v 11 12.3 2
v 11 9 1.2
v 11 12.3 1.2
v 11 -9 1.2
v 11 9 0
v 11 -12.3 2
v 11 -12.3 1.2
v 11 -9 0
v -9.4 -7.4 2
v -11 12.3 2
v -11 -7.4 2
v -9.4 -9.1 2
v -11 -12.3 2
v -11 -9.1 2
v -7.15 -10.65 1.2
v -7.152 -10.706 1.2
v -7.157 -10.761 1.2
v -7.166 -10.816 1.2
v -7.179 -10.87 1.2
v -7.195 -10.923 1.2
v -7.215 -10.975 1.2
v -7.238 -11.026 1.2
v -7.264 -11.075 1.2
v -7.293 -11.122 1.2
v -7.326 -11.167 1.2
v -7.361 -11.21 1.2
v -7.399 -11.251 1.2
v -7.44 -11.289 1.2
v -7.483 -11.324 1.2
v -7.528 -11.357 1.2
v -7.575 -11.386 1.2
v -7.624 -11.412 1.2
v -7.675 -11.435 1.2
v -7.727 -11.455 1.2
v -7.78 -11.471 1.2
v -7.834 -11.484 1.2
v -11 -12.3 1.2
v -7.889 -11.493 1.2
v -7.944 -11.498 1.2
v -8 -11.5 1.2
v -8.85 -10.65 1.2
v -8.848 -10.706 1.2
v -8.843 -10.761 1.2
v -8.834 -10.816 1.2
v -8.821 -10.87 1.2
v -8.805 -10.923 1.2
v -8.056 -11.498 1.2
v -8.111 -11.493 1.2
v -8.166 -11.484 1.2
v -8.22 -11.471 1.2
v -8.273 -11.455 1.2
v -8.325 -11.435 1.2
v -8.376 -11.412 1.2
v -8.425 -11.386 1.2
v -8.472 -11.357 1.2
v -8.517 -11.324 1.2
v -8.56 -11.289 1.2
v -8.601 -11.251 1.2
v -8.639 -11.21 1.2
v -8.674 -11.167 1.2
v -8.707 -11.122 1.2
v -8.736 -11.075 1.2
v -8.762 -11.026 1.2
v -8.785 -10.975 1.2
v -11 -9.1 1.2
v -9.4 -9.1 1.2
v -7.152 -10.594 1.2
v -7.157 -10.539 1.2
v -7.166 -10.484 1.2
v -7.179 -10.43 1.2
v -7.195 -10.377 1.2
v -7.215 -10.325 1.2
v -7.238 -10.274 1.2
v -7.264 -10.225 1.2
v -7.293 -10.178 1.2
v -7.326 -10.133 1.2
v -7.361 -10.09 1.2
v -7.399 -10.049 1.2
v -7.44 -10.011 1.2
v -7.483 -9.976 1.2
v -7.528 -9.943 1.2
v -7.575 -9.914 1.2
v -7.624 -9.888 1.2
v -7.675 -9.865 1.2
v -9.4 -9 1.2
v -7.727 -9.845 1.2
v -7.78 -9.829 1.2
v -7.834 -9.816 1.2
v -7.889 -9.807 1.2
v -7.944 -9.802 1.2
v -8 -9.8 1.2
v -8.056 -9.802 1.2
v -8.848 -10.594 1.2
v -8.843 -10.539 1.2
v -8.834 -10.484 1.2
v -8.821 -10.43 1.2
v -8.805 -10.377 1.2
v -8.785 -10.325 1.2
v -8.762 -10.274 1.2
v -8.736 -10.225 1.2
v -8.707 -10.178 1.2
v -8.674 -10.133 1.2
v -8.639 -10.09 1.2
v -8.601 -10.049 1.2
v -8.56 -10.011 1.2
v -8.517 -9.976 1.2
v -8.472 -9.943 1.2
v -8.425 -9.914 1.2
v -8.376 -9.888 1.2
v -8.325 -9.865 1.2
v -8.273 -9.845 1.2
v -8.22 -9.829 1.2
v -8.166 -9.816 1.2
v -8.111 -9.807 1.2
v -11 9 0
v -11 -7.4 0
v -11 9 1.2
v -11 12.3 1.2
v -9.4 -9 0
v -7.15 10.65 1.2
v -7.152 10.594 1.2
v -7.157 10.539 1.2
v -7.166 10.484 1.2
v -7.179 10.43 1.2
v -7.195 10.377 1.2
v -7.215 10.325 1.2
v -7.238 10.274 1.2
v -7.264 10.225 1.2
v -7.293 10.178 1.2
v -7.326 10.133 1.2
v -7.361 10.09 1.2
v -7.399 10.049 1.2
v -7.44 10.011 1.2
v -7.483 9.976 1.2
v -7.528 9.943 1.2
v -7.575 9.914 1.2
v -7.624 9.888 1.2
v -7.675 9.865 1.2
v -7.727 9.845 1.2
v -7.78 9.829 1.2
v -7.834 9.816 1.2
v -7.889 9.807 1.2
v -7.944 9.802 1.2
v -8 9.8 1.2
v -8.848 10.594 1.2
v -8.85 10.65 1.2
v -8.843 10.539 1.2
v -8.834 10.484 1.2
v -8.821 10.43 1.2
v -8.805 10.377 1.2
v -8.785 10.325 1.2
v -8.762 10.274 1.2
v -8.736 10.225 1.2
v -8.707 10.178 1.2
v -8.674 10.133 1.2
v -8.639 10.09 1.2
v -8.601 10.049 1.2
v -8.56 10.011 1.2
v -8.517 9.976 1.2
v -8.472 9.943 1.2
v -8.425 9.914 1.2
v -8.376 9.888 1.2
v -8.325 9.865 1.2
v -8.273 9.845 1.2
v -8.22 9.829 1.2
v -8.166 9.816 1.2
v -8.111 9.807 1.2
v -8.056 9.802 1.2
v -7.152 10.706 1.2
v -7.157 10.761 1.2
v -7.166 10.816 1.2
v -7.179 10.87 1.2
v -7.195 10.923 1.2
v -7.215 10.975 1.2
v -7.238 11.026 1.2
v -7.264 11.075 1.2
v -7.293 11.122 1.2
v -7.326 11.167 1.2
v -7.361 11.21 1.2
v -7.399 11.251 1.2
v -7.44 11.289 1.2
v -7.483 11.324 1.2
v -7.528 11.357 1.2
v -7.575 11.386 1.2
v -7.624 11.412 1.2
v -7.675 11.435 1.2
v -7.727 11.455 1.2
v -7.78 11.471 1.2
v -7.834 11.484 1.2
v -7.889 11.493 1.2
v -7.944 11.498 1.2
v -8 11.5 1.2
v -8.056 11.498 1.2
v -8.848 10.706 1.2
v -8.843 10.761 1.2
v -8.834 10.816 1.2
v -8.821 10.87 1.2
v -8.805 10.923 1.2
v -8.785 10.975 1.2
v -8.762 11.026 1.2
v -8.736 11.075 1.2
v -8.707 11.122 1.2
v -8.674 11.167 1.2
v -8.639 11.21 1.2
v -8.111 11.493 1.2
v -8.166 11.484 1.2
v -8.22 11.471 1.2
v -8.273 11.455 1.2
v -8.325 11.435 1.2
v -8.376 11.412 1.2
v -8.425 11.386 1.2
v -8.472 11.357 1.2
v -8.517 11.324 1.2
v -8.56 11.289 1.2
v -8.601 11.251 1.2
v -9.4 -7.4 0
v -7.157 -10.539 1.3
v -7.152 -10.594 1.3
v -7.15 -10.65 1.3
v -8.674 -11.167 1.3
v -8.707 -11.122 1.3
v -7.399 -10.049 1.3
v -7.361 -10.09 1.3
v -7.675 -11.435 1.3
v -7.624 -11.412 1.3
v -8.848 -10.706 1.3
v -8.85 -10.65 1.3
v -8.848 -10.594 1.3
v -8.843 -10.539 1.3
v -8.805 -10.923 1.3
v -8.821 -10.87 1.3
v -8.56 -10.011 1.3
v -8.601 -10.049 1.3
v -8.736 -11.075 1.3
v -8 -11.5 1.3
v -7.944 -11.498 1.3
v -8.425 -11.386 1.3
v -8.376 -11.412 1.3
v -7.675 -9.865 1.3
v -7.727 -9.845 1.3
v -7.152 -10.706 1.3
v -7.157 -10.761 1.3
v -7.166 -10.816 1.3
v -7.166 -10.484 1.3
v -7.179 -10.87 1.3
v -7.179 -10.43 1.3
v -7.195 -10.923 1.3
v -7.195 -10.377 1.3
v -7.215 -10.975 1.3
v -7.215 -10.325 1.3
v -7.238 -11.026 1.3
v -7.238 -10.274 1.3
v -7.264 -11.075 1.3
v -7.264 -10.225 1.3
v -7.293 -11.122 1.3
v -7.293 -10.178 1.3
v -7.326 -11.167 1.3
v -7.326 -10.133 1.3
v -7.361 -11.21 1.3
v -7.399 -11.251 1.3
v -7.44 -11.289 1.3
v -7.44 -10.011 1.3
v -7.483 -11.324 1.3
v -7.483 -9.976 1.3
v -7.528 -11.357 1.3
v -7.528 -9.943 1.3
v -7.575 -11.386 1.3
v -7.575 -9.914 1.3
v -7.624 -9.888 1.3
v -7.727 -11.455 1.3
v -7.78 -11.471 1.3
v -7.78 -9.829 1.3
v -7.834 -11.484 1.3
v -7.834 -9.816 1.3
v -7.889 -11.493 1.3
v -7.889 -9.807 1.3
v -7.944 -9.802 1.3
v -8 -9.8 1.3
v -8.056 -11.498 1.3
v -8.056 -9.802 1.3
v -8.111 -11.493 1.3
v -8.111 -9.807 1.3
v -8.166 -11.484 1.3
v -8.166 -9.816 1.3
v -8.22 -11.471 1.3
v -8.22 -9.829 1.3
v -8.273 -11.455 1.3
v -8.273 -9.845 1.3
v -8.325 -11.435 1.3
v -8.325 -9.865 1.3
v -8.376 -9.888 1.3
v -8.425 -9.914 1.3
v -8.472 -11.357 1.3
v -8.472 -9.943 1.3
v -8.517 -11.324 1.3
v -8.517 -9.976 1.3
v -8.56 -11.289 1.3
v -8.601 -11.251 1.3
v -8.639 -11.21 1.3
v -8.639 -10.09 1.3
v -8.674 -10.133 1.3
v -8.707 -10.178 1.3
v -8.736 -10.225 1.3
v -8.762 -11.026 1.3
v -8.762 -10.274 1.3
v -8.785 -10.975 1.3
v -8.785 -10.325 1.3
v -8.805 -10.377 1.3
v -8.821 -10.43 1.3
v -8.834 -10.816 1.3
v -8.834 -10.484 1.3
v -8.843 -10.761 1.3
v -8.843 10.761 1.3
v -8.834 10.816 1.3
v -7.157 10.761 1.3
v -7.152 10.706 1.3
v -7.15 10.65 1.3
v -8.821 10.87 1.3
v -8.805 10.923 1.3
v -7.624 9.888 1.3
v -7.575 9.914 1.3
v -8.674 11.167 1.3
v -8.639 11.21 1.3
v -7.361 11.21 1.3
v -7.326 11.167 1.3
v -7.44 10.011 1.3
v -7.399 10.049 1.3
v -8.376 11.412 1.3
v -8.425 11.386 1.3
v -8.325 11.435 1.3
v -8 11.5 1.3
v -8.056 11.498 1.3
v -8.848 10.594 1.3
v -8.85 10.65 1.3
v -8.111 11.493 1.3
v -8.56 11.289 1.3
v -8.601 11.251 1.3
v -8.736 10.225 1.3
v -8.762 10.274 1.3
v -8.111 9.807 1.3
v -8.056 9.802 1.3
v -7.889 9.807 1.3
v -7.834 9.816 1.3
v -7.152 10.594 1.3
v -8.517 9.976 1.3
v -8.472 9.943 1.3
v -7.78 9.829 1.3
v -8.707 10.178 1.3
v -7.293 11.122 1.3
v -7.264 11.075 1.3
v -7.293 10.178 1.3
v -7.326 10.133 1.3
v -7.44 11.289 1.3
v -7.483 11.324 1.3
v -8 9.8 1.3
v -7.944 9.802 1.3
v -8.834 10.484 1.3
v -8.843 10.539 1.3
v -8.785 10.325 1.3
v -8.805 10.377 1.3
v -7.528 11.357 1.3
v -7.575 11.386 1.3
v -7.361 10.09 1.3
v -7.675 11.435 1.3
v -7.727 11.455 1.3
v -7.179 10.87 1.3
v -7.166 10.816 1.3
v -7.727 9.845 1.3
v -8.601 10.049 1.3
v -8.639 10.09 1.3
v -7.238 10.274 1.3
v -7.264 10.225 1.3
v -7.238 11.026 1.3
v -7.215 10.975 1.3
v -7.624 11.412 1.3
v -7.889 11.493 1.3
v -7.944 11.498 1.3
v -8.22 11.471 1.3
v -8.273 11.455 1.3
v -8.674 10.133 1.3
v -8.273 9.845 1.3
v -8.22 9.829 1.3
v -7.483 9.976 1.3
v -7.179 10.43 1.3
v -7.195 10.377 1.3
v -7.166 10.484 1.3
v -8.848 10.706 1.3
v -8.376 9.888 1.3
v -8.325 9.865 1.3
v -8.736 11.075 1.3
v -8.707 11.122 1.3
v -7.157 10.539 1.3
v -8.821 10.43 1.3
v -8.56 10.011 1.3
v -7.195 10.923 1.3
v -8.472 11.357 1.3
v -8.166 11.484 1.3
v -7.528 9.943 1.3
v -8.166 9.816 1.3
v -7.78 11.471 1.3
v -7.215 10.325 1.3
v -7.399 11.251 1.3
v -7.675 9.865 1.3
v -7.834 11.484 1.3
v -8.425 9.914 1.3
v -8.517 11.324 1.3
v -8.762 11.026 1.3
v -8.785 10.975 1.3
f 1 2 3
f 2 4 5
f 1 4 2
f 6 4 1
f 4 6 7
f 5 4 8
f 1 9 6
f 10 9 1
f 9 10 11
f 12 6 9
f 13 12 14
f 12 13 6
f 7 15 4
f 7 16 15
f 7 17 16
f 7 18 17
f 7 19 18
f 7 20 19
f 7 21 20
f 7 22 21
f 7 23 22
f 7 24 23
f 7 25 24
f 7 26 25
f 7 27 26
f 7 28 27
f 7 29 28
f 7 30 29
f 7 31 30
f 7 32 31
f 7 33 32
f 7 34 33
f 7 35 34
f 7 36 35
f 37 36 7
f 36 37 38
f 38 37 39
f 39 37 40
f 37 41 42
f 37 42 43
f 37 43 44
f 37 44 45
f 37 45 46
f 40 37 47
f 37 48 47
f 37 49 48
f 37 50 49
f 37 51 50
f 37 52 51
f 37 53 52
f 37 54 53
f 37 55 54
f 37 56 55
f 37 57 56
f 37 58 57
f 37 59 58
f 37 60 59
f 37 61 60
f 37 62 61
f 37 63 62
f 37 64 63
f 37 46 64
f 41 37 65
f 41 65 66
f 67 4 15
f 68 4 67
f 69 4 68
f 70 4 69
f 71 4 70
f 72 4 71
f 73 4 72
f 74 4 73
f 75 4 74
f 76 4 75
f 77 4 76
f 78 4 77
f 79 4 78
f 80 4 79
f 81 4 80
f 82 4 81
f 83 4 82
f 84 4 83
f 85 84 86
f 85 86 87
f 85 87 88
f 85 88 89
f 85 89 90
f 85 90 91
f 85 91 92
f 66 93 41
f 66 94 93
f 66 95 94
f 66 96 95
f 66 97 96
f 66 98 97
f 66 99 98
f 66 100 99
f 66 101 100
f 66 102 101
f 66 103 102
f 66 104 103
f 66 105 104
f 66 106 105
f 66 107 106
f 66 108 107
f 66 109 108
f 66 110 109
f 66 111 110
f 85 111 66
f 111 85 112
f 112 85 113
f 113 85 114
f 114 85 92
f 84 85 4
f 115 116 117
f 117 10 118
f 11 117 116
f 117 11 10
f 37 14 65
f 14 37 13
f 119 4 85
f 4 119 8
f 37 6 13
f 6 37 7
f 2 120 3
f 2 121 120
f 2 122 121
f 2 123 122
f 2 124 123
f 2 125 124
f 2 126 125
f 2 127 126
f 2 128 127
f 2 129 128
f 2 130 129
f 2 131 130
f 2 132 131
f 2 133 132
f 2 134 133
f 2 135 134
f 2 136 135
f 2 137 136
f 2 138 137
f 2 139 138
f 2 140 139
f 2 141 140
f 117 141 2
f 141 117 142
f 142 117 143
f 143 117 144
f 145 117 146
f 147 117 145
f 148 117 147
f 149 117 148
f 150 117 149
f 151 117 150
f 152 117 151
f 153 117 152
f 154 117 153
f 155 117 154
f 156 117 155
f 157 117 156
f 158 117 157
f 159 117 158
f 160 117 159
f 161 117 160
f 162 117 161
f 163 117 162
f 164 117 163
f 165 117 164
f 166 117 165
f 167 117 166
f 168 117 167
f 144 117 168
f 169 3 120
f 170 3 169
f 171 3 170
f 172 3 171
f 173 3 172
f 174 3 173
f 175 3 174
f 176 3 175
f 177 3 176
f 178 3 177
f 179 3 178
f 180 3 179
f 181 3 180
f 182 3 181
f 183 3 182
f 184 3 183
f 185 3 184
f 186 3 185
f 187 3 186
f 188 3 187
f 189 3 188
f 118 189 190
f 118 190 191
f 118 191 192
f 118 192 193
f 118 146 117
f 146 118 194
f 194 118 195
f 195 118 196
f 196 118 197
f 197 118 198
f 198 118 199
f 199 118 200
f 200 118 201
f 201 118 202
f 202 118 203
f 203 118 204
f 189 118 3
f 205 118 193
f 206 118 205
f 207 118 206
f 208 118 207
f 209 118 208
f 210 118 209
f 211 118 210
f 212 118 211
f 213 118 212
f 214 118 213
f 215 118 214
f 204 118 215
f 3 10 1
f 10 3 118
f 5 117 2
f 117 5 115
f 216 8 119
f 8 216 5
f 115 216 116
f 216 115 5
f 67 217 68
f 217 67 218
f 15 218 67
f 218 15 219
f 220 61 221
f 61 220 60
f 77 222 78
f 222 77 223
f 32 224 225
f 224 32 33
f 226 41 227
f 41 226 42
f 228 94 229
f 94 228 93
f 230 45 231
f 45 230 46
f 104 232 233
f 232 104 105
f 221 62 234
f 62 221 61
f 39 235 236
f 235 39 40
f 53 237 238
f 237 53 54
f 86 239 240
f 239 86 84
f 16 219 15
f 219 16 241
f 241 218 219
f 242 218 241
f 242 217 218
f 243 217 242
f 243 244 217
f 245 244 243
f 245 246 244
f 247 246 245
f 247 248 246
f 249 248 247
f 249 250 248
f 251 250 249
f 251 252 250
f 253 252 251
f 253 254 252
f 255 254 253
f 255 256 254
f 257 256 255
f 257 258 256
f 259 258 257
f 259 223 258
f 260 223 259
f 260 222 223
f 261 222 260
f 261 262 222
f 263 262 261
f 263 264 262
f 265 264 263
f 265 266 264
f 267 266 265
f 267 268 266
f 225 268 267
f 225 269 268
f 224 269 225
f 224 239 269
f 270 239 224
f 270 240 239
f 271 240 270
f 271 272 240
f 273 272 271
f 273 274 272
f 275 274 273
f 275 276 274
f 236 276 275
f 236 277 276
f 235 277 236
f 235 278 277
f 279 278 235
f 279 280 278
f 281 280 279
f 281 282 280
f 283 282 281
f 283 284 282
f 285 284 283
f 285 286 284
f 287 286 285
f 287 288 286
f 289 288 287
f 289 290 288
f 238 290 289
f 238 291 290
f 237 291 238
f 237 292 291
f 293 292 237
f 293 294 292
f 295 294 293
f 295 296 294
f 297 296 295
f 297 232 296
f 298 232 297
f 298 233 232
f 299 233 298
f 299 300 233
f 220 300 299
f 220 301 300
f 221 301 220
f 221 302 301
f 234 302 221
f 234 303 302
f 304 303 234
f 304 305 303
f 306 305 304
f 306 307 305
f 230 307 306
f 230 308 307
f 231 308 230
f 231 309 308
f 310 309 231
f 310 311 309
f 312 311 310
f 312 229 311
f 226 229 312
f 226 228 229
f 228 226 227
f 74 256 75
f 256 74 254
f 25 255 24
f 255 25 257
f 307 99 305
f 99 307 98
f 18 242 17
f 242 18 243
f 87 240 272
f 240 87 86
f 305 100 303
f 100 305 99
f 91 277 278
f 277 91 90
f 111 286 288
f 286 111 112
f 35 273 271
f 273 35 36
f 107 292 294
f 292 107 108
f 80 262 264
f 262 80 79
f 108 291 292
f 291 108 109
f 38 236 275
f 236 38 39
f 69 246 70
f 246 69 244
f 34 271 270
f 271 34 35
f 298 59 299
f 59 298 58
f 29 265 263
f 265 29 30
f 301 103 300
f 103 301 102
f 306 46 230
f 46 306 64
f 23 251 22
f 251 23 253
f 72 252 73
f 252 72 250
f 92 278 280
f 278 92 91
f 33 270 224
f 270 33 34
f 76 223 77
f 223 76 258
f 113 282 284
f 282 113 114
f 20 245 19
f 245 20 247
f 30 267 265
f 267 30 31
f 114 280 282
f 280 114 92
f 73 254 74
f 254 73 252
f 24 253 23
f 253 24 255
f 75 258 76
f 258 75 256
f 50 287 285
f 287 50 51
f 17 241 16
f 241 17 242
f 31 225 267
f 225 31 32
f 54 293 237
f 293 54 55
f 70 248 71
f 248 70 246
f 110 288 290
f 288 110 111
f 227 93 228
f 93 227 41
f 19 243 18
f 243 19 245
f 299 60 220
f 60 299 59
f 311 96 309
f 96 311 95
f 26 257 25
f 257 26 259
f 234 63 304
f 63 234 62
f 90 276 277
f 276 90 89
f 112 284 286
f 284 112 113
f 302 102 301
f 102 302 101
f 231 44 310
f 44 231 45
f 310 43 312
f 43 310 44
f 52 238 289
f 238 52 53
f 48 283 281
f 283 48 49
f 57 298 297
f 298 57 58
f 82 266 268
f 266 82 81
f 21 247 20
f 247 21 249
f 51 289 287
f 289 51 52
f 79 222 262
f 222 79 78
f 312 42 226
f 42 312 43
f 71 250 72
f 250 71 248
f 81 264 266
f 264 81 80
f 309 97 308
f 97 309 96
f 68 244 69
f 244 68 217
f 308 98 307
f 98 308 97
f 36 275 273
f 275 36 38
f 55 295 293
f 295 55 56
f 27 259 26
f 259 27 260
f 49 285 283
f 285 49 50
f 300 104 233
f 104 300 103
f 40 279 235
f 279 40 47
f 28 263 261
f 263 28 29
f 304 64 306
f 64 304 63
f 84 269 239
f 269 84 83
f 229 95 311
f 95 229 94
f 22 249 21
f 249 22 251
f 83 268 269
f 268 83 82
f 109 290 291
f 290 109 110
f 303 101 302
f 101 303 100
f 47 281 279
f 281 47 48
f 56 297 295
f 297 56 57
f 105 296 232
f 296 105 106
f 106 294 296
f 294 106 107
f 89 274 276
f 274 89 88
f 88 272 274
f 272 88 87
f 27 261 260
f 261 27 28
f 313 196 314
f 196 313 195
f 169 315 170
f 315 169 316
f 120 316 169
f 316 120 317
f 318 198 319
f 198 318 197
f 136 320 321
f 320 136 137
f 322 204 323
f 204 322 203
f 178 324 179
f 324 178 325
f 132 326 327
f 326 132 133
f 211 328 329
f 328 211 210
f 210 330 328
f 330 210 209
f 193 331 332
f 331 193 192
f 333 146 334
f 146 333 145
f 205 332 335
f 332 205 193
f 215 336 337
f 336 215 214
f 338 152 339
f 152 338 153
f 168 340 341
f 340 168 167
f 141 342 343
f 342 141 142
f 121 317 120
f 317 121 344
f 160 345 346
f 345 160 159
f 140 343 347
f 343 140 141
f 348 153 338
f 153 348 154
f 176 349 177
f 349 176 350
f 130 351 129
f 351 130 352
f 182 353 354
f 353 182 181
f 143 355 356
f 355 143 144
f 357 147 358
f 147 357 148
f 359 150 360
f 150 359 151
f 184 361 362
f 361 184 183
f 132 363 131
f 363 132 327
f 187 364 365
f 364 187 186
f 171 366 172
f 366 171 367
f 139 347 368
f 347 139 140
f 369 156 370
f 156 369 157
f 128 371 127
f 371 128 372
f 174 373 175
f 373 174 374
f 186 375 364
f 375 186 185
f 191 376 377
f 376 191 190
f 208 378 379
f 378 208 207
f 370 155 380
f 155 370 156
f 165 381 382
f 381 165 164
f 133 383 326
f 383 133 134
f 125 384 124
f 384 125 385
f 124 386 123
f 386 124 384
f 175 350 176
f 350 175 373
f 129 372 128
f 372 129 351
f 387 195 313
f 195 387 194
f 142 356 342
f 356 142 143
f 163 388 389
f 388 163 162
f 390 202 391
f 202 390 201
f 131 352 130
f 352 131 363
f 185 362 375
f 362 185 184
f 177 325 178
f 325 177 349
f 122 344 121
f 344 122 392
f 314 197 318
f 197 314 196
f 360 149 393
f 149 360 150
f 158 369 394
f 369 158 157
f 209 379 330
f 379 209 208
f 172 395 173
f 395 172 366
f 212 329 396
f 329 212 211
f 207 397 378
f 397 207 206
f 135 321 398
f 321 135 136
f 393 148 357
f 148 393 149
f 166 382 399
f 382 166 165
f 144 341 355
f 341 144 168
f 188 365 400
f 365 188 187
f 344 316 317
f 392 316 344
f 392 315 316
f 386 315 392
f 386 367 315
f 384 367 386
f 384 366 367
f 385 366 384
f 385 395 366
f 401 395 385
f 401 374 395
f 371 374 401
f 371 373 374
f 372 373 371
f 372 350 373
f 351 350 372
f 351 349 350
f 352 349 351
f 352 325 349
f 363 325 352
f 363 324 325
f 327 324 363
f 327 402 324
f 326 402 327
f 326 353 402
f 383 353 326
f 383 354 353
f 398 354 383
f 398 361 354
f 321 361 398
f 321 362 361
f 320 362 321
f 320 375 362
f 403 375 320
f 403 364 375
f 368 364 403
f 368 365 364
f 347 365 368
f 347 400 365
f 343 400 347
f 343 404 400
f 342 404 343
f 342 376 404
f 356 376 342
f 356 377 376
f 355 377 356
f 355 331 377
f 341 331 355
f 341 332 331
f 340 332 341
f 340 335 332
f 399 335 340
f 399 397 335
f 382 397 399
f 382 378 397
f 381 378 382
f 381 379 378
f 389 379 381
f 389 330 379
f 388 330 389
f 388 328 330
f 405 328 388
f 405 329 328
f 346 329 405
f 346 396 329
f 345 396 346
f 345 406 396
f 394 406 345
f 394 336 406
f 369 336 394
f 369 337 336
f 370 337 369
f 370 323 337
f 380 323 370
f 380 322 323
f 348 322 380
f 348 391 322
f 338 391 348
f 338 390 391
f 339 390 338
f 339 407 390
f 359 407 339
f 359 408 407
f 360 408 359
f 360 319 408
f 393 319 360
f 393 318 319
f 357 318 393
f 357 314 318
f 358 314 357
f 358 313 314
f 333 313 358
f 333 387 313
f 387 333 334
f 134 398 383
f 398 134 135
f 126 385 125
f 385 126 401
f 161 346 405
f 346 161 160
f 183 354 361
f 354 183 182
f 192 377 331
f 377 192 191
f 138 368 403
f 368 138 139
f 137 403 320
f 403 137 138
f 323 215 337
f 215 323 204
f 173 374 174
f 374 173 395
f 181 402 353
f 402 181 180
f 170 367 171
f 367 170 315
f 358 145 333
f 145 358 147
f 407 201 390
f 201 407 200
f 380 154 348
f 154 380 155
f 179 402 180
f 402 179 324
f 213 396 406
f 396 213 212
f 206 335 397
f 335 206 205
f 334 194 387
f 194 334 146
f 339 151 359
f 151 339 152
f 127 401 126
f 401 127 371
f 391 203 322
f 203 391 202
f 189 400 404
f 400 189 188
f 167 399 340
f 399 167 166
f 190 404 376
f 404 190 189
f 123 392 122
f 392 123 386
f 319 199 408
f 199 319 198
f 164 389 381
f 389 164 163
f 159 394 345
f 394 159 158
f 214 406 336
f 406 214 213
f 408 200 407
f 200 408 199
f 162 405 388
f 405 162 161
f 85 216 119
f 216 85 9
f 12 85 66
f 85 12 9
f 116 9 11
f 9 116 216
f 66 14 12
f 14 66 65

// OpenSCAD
// =============================================================================
// electrode_pcb.scad — CortiPod stepped electrode PCB
//
// Replaces the old bottom_shell (electrode tray). The PCB itself has
// integrated mechanical features — no separate tray needed.
//
// Manufactured as 2.0mm FR4 (JLCPCB max standard thickness) with
// depth-controlled milling from the FRONT (skin) side on the ±Y
// ledge regions, leaving 0.8mm remaining.
//
// Profile (Y-Z cross-section):
//
//   Back (pogo pin side) — FLAT across full board
//   ═══════════════════════════════════════════════
//   │  ledge  │                          │ ledge │   ← 0.8mm (milled)
//   │ (thin)  │     full 2.0mm thick     │(thin) │
//   └─────────┘     sensing area         └───────┘
//                   with electrodes
//                   on bottom face
//                        ↓
//                   protrudes to skin (1.2mm step)
//
// The thin ±Y ledges slide into the shell's U-channels.
// The thick center protrudes through the skin window for sweat contact.
// ±X edges are full thickness (no milling needed — not in channels).
//
// Orientation key: chamfer on one corner prevents MIP/NIP swap.
// Detent notch: milled recess in ledge edge for channel bump click.
//
// JLCPCB fabrication:
//   - Board thickness: 2.0mm
//   - Surface finish: ENIG (applied before milling)
//   - Depth milling: mark ±Y ledge regions on User.1 layer
//   - Milling depth: 1.2mm from front face (leaves 0.8mm)
//   - Tolerance: ±0.1mm on milling depth
//
// Print note: this is a PCB, not a printed part. This file is for
// visualization in OpenSCAD assembly views only.
// =============================================================================

include <parameters.scad>

$fn = $preview ? 32 : 96;

// ---- Main module ----
module electrode_pcb() {
    difference() {
        union() {
            sensing_area();
            ledges();
        }
        orientation_key();
        detent_notches();
    }
}

// ---- Sensing area (full thickness center) ----
// The thick zone carrying electrodes on the front and contacts on the back.
// Positioned so the sensing face is at Z = 0 (skin) and back at Z = 2.0.
module sensing_area() {
    translate([-electrode_sensing_x/2, -electrode_sensing_y/2, 0])
        cube([electrode_sensing_x, electrode_sensing_y, electrode_board_thickness]);
}

// ---- Thin ledges (±Y extensions) ----
// Depth-milled from the front (skin) side. The back surface is flush
// with the sensing area back (Z = electrode_board_thickness).
// The front surface is at Z = electrode_step_height (recessed 1.2mm
// from the sensing face).
module ledges() {
    for (side = [-1, 1]) {
        // Y position: starts at the sensing area edge, extends outward
        y_start = side * electrode_sensing_y/2;
        y_pos = (side > 0) ? y_start : y_start - electrode_ledge_y;

        translate([-electrode_pcb_x/2, y_pos, electrode_step_height])
            cube([electrode_pcb_x, electrode_ledge_y, electrode_ledge_thickness]);
    }
}

// ---- Orientation key ----
// Corner chamfer at one corner of the sensing zone.
// Prevents 180° rotation error during insertion.
// Cut from the -X, -Y corner of the sensing area.
module orientation_key() {
    translate([-electrode_sensing_x/2 - 0.1,
               -electrode_sensing_y/2 - 0.1,
               -0.1])
        cube([chamfer_size + 0.2,
              chamfer_size + 0.2,
              electrode_board_thickness + 0.2]);
}

// ---- Detent notches ----
// Small recesses milled into the ±Y ledge edges (matching the channel
// detent bumps). These can be done during the same depth-routing
// operation as the ledge milling.
module detent_notches() {
    notch_d     = detent_bump_diameter + 0.2;
    notch_depth = detent_bump_height + 0.1;

    // X position matches the channel bump position when PCB is fully seated.
    // Fully seated: PCB -X edge at hard stop → PCB center offset from pod center.
    // Hard stop at channel_x_start = -pod_length/2 + wall_thickness = -12.5mm
    // PCB -X edge at hard stop: -12.5mm → PCB center at -12.5 + electrode_pcb_x/2
    // Bump at channel_x_start + detent_position
    // Notch X relative to PCB center:
    //   bump_x_abs = channel_x_start + detent_position
    //   pcb_center_x = channel_x_start + electrode_pcb_x/2
    //   notch_x = bump_x_abs - pcb_center_x = detent_position - electrode_pcb_x/2
    notch_x = detent_position - electrode_pcb_x/2;

    for (side = [-1, 1]) {
        // Y position: on the ledge, matching channel bump Y
        ledge_y_center = side * (electrode_sensing_y/2 + electrode_ledge_y/2);

        // Notch cut from the bottom of the ledge (channel floor side)
        translate([notch_x, ledge_y_center, electrode_step_height - notch_depth])
            cylinder(d=notch_d, h=notch_depth + 0.1);
    }
}

// ---- Render ----
electrode_pcb();
